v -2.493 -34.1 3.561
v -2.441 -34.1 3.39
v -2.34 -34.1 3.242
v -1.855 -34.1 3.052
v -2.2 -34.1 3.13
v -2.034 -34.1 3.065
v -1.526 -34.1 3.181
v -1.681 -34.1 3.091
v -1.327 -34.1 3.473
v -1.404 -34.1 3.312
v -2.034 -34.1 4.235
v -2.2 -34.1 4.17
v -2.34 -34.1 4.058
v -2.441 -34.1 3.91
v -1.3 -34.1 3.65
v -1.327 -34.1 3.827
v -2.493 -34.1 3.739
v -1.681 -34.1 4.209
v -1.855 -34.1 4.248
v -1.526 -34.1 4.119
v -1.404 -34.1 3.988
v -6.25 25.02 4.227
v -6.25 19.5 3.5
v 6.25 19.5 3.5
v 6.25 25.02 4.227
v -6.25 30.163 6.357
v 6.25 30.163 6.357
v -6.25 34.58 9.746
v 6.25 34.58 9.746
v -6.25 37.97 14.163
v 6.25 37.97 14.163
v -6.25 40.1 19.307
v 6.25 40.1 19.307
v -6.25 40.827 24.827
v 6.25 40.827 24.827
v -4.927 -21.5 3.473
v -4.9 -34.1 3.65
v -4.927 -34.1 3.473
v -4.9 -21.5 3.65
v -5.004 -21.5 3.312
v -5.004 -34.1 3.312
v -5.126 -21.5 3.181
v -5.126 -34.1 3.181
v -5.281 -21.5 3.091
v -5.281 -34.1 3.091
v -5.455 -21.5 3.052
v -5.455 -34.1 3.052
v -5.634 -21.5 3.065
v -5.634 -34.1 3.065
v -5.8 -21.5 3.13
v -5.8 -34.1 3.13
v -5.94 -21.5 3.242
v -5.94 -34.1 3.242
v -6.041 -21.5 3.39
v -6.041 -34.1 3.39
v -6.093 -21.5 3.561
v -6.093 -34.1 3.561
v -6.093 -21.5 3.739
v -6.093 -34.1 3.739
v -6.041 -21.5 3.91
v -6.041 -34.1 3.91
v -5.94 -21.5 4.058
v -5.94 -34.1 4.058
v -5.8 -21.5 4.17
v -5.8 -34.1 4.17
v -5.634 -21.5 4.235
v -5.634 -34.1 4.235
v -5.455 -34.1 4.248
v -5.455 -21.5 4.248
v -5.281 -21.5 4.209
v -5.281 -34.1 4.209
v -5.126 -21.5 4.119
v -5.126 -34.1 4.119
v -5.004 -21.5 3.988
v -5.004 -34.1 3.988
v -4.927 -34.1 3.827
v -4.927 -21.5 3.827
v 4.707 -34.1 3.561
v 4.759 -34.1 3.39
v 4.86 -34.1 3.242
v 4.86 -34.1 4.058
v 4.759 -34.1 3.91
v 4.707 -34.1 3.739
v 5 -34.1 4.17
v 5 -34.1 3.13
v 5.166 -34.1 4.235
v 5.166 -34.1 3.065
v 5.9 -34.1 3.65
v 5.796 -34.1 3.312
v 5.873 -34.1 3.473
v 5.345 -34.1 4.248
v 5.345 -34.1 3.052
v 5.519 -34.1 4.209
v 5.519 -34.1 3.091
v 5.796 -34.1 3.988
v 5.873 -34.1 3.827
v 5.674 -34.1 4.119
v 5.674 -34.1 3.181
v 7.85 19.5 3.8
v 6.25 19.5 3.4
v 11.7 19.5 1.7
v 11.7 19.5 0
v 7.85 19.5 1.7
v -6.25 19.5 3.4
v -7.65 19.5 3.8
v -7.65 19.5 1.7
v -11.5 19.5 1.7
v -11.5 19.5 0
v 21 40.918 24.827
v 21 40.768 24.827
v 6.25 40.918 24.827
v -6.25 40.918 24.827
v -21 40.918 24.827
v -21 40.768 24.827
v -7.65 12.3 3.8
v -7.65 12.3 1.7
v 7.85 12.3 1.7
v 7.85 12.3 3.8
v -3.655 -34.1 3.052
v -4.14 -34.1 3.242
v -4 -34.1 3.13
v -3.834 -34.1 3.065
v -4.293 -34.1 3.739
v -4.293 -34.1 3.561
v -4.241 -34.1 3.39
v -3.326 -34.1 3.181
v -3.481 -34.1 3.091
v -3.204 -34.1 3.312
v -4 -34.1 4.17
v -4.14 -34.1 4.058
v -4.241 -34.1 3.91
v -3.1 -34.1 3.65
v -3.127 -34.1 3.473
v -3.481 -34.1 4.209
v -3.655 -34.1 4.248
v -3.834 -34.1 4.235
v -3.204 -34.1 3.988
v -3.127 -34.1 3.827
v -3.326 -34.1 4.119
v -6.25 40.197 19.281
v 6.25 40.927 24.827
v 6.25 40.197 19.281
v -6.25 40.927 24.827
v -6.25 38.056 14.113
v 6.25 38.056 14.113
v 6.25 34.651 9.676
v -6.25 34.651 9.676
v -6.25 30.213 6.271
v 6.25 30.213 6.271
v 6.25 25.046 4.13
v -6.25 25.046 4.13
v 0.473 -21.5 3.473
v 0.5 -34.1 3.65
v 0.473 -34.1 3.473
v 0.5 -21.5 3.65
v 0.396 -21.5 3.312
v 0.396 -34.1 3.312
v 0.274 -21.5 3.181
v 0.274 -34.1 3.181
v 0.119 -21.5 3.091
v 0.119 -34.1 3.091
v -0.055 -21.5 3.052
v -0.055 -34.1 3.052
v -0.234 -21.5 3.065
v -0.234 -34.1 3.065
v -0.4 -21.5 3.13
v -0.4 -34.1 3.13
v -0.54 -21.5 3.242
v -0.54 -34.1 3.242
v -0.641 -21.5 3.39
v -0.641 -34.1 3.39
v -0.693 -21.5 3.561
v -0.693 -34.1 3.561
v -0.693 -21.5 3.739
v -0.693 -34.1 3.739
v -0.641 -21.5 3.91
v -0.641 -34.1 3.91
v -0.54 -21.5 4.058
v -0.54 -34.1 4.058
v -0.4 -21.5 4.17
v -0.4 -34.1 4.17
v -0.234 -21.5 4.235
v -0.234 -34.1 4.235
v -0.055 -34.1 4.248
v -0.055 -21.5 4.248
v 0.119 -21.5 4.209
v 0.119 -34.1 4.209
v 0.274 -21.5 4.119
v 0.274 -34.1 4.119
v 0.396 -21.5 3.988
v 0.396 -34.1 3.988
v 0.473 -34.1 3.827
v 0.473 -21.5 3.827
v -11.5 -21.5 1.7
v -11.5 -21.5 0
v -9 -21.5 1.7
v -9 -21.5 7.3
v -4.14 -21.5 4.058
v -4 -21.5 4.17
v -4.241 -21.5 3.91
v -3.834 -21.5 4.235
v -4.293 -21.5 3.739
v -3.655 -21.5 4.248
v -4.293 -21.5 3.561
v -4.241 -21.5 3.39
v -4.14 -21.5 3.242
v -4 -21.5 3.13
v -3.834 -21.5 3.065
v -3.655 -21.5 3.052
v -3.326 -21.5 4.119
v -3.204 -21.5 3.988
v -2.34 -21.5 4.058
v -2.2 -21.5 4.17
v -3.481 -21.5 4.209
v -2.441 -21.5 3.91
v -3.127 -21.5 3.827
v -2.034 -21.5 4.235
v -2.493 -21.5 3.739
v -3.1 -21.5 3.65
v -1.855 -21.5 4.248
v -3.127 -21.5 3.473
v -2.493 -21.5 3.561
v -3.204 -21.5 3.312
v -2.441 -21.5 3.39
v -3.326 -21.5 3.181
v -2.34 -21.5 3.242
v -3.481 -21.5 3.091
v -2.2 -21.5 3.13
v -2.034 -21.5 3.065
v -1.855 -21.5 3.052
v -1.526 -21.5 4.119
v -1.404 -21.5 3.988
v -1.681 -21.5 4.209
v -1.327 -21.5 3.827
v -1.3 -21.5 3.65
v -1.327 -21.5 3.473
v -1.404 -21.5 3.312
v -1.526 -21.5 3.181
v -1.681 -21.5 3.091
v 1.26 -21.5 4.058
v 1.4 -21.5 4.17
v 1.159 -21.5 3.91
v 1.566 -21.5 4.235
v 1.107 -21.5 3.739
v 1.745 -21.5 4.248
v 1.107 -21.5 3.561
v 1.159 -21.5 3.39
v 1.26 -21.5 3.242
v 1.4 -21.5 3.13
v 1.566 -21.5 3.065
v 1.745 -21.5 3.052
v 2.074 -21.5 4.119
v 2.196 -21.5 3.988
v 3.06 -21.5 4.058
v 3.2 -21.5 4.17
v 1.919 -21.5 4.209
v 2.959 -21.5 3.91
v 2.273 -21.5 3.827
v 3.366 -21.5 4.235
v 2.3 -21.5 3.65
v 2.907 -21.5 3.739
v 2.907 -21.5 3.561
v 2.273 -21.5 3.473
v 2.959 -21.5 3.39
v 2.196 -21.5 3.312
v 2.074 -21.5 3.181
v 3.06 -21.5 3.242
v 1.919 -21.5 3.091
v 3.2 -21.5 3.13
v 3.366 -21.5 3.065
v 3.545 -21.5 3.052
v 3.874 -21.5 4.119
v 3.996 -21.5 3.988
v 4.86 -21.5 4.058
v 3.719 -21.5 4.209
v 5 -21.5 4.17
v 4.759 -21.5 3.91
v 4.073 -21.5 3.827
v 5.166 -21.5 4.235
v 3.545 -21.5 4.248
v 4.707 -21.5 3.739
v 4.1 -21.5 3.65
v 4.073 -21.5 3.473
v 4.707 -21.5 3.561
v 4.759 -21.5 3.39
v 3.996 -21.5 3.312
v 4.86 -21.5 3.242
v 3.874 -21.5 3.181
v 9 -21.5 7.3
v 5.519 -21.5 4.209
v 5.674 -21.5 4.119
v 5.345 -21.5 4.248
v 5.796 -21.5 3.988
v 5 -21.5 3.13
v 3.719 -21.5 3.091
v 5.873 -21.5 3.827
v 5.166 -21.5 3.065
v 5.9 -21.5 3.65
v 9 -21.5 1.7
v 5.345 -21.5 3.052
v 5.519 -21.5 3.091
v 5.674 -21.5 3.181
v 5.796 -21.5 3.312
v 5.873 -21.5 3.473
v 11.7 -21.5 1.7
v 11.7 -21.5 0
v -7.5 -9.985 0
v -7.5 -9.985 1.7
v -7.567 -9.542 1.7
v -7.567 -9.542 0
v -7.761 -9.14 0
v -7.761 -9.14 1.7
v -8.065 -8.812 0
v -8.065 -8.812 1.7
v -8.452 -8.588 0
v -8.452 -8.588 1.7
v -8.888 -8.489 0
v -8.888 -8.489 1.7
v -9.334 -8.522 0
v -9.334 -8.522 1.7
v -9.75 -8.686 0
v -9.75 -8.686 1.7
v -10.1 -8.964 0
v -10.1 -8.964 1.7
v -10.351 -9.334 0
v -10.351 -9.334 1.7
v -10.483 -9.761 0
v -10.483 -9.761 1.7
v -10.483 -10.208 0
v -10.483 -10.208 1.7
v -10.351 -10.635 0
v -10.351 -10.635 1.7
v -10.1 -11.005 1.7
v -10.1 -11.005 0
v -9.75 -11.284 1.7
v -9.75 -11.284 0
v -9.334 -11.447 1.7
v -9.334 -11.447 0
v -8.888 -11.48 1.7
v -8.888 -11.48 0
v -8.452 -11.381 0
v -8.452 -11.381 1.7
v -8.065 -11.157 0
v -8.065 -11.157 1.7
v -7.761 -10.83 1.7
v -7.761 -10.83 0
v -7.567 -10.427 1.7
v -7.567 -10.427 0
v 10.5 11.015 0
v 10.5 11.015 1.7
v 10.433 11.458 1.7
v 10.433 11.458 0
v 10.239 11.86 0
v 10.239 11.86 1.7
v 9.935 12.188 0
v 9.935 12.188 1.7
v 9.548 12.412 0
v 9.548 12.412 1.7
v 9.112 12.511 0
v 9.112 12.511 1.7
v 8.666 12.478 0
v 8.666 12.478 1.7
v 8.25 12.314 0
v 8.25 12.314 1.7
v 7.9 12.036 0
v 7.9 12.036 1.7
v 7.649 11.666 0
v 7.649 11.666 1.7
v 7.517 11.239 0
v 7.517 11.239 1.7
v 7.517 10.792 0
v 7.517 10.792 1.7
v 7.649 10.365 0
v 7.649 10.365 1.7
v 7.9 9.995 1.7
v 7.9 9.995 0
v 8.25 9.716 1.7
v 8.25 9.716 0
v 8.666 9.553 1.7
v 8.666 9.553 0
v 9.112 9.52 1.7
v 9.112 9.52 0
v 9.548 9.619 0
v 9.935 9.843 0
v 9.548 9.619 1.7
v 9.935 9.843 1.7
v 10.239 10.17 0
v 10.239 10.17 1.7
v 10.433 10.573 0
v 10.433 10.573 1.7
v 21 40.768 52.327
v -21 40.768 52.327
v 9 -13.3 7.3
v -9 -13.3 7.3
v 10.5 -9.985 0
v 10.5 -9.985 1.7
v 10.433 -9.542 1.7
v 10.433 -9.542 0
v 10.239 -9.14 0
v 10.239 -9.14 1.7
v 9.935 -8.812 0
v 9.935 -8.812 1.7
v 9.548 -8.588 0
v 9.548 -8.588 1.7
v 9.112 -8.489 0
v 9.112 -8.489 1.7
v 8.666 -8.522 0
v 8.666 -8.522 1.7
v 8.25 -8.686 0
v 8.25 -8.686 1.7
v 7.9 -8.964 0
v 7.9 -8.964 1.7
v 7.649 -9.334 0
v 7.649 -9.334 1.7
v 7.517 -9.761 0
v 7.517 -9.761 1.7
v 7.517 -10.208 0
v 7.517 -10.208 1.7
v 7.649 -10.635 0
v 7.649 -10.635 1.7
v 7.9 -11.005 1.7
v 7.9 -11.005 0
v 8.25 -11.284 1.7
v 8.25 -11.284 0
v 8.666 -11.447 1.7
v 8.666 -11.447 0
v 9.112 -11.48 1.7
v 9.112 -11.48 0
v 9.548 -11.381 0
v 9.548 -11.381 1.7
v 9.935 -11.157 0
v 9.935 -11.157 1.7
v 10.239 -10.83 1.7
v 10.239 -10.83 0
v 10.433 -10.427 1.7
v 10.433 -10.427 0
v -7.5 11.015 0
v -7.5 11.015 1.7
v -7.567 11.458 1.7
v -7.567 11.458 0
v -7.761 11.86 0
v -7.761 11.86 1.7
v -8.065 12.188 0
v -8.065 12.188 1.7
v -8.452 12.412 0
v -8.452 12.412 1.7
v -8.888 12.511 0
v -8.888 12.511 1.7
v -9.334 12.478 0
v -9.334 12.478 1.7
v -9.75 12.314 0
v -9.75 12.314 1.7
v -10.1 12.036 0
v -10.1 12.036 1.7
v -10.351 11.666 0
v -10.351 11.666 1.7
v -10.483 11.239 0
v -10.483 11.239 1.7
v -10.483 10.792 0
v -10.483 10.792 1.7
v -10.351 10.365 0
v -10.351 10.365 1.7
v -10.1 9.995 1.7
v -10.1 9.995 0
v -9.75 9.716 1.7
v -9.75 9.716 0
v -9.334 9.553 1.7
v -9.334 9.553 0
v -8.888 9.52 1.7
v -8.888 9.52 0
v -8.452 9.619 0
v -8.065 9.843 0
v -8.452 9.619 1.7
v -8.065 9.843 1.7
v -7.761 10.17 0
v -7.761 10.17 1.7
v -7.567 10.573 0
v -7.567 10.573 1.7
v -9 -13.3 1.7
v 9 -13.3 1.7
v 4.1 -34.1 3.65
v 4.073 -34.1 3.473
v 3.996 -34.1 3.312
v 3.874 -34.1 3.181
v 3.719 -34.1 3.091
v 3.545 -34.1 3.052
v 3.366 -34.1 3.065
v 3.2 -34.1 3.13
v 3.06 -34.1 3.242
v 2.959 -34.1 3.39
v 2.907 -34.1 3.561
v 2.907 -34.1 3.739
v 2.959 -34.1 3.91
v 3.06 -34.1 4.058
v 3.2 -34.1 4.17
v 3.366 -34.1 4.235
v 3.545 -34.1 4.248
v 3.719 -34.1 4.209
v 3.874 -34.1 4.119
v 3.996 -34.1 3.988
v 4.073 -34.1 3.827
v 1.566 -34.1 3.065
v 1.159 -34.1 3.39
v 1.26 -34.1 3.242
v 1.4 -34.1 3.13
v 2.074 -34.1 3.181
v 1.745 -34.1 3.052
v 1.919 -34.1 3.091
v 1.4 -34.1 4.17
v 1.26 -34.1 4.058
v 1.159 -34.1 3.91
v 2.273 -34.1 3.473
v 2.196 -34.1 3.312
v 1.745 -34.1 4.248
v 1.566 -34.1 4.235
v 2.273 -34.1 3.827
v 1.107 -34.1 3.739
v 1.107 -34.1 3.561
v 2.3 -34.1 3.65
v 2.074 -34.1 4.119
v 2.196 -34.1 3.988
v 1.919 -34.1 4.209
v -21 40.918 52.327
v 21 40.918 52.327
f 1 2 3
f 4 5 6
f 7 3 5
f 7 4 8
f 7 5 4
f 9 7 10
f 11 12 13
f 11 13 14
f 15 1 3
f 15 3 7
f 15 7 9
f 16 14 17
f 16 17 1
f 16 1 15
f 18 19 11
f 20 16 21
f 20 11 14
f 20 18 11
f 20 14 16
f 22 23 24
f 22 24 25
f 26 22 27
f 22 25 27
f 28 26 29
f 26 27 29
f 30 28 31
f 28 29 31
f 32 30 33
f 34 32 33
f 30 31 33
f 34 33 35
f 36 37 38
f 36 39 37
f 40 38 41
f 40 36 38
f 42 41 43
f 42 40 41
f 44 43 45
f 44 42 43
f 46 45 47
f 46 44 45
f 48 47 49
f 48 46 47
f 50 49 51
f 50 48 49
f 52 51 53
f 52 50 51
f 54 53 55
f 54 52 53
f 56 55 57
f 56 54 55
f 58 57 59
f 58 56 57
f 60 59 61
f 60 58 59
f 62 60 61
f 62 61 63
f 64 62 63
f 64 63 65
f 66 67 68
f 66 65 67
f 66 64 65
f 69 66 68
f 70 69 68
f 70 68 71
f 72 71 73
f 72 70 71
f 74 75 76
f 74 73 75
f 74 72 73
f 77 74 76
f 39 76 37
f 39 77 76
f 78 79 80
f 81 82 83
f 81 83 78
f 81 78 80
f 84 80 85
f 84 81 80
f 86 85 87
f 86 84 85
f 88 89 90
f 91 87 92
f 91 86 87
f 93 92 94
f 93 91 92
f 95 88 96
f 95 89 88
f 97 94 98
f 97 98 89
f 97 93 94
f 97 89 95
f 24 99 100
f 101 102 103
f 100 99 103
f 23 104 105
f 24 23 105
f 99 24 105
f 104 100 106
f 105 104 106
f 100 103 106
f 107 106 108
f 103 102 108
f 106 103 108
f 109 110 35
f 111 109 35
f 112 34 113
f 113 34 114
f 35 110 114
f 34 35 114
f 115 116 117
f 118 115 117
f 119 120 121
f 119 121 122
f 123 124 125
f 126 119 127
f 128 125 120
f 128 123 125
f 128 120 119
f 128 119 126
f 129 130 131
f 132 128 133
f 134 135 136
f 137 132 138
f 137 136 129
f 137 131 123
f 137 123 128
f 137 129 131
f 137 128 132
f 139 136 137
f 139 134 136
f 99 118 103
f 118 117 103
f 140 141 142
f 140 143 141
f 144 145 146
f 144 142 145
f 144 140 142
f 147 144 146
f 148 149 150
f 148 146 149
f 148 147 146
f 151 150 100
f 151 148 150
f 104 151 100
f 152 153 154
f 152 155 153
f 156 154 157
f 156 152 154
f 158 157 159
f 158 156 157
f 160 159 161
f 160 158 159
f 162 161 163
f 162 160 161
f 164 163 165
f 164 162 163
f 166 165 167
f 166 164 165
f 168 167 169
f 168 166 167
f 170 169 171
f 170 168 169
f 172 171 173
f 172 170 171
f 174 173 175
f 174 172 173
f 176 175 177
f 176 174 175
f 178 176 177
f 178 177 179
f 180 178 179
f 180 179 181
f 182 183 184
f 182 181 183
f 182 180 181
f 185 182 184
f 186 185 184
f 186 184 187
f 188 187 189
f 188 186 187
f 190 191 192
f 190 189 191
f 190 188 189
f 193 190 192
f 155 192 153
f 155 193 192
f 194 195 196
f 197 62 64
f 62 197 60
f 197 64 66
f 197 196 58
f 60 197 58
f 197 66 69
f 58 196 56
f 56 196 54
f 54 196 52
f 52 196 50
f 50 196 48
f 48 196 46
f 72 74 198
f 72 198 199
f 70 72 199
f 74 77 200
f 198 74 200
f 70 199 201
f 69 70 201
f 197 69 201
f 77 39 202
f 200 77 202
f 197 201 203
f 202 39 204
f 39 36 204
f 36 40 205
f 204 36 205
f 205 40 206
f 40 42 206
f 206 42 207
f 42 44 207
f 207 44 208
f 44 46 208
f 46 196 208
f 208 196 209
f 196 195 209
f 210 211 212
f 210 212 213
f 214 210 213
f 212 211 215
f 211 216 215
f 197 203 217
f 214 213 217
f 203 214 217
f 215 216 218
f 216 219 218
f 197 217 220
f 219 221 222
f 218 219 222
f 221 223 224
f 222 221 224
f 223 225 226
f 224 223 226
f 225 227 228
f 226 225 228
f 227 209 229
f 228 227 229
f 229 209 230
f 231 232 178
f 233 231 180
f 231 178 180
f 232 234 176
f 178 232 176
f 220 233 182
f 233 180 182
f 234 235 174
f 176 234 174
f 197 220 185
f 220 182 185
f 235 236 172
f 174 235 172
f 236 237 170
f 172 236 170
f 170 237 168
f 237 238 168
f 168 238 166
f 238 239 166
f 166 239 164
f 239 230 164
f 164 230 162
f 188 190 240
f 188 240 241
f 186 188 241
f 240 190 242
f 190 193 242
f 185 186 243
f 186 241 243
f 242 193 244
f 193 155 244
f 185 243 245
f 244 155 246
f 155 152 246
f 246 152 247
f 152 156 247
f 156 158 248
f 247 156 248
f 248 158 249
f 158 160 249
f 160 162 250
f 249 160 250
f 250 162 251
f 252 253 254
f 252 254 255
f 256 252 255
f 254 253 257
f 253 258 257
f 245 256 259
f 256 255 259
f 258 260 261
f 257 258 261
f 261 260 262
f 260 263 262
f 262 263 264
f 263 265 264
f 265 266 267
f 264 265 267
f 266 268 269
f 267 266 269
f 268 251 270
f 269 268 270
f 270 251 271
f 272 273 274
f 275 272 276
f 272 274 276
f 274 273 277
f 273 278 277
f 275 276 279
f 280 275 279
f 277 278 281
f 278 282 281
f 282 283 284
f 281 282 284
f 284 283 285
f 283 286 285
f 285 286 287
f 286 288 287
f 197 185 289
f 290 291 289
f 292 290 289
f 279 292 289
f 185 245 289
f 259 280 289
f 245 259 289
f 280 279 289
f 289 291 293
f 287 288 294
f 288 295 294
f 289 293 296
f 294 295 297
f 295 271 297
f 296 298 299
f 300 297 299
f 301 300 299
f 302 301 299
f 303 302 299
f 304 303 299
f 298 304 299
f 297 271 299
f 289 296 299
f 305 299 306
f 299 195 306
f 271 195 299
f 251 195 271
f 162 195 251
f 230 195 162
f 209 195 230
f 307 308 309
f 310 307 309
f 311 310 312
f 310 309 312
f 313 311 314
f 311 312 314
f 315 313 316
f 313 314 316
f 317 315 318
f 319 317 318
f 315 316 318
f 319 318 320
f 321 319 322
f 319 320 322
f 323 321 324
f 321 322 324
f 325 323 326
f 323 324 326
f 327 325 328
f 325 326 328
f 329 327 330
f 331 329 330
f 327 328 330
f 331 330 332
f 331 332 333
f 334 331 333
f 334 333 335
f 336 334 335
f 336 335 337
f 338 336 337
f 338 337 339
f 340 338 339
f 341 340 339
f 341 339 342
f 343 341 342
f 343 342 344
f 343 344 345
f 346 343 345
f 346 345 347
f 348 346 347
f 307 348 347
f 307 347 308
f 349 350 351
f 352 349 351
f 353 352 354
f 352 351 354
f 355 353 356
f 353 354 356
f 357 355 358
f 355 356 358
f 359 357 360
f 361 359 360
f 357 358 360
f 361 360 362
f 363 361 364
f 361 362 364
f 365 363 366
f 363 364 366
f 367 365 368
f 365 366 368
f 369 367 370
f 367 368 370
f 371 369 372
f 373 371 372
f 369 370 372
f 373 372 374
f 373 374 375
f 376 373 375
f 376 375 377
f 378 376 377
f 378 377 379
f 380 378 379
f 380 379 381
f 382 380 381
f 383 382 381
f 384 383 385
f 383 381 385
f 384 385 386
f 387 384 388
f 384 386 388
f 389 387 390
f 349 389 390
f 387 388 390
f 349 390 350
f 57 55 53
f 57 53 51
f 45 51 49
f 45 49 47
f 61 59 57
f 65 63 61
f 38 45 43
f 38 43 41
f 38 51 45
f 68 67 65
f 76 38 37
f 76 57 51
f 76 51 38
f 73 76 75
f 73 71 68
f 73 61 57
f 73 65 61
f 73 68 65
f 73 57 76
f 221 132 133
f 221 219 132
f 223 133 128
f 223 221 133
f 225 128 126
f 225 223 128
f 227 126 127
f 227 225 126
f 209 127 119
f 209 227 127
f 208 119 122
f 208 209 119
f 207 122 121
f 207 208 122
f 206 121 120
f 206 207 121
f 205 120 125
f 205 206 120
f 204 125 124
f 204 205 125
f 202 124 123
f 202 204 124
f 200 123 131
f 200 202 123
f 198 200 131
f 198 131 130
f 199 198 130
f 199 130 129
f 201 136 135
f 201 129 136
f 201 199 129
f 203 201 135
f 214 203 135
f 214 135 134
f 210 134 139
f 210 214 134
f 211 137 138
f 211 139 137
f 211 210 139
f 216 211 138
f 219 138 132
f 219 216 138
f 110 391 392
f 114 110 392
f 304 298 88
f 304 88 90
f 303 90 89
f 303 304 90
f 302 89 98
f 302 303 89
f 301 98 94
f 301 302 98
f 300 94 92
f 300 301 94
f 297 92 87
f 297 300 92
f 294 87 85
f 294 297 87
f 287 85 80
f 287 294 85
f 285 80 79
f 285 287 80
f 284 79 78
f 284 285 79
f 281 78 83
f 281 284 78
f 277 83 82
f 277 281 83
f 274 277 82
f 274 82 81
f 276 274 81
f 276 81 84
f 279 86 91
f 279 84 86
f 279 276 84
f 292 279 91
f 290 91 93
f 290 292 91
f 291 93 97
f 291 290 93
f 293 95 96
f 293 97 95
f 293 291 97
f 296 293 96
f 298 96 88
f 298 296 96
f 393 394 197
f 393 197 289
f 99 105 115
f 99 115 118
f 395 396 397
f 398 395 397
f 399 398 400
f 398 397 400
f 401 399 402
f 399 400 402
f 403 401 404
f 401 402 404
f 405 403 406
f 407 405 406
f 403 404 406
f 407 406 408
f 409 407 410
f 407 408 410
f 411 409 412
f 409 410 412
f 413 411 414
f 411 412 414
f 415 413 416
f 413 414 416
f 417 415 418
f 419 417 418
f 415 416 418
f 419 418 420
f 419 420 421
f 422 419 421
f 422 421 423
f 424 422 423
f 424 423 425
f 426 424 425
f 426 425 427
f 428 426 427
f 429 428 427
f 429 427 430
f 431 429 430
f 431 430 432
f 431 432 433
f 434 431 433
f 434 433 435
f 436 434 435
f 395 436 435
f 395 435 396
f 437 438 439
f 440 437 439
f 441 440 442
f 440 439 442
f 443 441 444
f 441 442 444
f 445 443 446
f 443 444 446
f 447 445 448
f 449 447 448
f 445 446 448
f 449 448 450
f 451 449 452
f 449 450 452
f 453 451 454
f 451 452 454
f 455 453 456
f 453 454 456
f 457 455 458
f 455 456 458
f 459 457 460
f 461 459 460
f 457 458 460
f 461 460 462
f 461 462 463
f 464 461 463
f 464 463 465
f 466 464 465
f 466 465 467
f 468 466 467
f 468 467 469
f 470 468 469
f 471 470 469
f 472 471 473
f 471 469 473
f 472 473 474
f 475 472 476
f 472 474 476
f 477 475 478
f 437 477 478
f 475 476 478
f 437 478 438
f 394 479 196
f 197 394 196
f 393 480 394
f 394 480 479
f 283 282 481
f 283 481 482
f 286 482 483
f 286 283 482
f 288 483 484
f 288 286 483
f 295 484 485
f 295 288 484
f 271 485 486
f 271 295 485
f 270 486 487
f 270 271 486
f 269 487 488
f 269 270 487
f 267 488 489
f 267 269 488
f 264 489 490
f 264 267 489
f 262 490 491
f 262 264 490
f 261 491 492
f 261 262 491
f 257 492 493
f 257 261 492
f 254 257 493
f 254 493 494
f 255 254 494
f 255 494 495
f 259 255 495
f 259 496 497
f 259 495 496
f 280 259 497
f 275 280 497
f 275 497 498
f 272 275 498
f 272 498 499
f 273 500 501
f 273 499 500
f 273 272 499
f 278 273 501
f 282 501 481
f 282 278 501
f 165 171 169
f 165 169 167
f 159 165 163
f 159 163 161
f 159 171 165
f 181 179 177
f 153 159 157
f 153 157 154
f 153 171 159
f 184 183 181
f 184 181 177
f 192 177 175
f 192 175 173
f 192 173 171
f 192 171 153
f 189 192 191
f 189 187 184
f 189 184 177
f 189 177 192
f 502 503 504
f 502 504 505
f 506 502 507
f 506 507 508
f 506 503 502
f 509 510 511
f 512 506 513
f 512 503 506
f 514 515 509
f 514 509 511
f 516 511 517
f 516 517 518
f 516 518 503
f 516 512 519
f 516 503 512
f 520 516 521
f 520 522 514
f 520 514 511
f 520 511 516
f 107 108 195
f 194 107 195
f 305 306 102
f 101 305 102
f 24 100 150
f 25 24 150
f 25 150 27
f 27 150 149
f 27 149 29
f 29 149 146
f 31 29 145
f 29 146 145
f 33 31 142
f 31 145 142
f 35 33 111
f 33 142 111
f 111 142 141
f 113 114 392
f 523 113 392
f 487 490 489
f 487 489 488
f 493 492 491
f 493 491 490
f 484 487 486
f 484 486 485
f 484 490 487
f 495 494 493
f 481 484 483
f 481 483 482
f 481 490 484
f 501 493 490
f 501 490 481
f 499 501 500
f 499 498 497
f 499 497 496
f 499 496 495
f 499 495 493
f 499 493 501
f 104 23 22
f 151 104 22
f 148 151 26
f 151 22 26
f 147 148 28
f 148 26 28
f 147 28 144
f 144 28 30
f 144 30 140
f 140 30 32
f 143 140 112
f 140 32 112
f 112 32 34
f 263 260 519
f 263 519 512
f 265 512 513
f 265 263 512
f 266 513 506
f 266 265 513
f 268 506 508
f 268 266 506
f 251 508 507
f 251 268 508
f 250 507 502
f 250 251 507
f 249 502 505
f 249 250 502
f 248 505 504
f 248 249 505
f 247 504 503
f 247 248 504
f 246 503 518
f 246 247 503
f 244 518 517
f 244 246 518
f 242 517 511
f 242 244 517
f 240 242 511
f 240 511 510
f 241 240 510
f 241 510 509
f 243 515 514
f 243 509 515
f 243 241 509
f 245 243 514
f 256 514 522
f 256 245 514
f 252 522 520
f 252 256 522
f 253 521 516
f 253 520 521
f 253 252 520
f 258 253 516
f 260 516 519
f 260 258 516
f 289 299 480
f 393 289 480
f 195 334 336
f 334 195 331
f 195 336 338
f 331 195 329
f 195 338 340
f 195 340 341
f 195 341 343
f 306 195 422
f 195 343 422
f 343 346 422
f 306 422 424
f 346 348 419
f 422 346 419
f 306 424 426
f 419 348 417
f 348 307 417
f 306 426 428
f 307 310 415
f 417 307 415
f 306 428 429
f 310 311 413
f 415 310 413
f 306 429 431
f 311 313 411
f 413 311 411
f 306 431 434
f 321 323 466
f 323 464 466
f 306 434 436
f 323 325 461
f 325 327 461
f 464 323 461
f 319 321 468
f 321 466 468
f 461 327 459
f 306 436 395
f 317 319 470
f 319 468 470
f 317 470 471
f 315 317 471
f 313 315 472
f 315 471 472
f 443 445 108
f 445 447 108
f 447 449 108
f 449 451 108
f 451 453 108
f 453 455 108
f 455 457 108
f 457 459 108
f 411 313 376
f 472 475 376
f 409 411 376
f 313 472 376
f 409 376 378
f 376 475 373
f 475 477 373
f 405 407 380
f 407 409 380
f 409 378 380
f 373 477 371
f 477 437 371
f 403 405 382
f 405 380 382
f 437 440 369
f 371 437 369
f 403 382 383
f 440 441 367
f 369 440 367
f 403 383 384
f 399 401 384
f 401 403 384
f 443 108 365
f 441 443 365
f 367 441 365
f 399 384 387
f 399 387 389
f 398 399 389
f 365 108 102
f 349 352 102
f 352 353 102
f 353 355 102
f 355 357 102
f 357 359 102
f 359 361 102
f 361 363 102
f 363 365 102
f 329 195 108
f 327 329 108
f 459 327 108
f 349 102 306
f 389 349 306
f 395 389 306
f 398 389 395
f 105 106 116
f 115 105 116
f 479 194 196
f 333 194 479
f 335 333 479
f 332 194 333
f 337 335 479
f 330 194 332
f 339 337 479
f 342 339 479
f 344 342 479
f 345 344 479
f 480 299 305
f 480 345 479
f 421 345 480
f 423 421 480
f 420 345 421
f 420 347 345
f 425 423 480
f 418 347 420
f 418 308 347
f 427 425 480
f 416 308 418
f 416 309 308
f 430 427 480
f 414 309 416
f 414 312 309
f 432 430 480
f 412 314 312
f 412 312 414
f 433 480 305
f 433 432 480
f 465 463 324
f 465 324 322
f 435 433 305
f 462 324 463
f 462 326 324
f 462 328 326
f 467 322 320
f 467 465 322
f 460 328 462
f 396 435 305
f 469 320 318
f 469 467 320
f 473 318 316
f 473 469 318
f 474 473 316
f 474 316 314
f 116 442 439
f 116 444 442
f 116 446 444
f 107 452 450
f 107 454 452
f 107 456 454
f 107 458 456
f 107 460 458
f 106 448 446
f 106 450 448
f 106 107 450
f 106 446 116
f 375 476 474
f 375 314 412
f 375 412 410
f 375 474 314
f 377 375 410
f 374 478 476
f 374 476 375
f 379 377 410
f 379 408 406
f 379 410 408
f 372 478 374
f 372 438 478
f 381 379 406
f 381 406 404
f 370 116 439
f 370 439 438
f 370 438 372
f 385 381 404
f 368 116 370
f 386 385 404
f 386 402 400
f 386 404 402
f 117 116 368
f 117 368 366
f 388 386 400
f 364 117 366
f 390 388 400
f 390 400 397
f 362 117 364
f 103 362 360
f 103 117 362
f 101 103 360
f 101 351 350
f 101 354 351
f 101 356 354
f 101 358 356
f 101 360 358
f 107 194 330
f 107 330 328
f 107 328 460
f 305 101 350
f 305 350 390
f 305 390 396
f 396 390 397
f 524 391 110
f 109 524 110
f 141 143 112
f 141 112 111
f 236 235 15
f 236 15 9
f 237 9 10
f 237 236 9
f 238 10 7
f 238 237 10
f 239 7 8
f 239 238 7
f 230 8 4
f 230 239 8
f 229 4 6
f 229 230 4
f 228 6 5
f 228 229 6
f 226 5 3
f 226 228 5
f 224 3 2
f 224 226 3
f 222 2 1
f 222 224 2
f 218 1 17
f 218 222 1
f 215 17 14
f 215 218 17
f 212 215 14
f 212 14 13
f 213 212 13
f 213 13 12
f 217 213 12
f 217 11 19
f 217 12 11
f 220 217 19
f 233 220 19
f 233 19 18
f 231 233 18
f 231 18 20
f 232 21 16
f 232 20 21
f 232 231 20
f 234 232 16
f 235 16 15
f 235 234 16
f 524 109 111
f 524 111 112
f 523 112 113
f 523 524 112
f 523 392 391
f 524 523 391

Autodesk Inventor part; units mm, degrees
ref_plane "YZ Plane" through (0, 0, 0) normal (1, 0, 0) x (0, 1, 0)
ref_plane "XZ Plane" through (0, 0, 0) normal (0, 1, 0) x (-1, 0, 0)
ref_plane "XY Plane" through (0, 0, 0) normal (0, 0, 1) x (1, 0, 0)
sketch "Эскиз1" plane through (0, 0, 0) normal (0, 0, 1) x (1, 0, 0)
  line L0 (-11.5, -21.5) -> (11.7, -21.5)
  line L1 (11.7, -21.5) -> (11.7, 19.5)
  line L2 (11.7, 19.5) -> (-11.5, 19.5)
  line L3 (-11.5, 19.5) -> (-11.5, -21.5)
  circle A0 centre (-9, -10.5) radius 1.5 projected
  point P0 (0, 0)
  dimension "d0" = 23.2
  dimension "d1" = 41
  dimension "d4" = 11
  dimension "d5" = 2.5
extrude "Выдавливание1" add sketch "Эскиз1" along normal blind 1.7 contours L3 L2 L1 L0 | A0
sketch "Эскиз2" plane through (0, 0, 1.7) normal (0, 0, 1) x (1, 0, 0)
  circle A0 centre (-9, -9.9846) radius 1.5 projected
  circle A1 centre (9, -9.9846) radius 1.5 projected
  circle A2 centre (-9, 11.0154) radius 1.5 projected
  circle A3 centre (9, 11.0154) radius 1.5 projected
  point P0 (0, 0)
extrude "Выдавливание2" cut sketch "Эскиз2" against normal blind 1.7
sketch "Эскиз3" plane through (0, 0, 1.7) normal (0, 0, 1) x (1, 0, 0)
  line L0 (-9, -21.5) -> (9, -21.5)
  line L1 (9, -21.5) -> (9, -13.3)
  line L2 (9, -13.3) -> (-9, -13.3)
  line L3 (-9, -13.3) -> (-9, -21.5)
  line L4 (-11.5, -21.5) -> (11.7, -21.5) projected
  point P0 (0, 0)
  point P1 (0, -21.5)
  point P2 (0.1, -21.5)
  dimension "d8" = 18
  dimension "d9" = 8.2
extrude "Выдавливание3" add sketch "Эскиз3" along normal blind 5.6
sketch "Эскиз4" plane through (-11.5, -21.5, 0) normal (0, -1, 0) x (1, 0, 0)
  circle A0 centre (6, 3.65) radius 0.6
  line L0 (2.5, 7.3) -> (20.5, 7.3) projected
  line L1 (6, 7.3) -> (6, 0) construction
  line L2 (0, 0) -> (0, 1.7) projected
  circle A1 centre (7.8, 3.65) radius 0.6
  circle A2 centre (9.6, 3.65) radius 0.6
  circle A3 centre (11.4, 3.65) radius 0.6
  circle A4 centre (13.2, 3.65) radius 0.6
  circle A5 centre (15, 3.65) radius 0.6
  circle A6 centre (16.8, 3.65) radius 0.6
  point P0 (11.5, 0)
  dimension "d12" = 1.2
  dimension "d13" = 6
  dimension "d16" = 1.8
extrude "Выдавливание4" add sketch "Эскиз4" along normal blind 12.6
sketch "Эскиз5" plane through (0, 0, 1.7) normal (0, 0, 1) x (1, 0, 0)
  line L0 (-7.65, 12.3) -> (7.85, 12.3)
  line L1 (7.85, 12.3) -> (7.85, 19.5)
  line L2 (7.85, 19.5) -> (-7.65, 19.5)
  line L3 (-7.65, 19.5) -> (-7.65, 12.3)
  line L4 (11.7, 19.5) -> (-11.5, 19.5) projected
  point P0 (0, 0)
  point P1 (0.1, 19.5)
  point P2 (0.1, 19.5)
  dimension "d23" = 15.5
  dimension "d24" = 7.2
extrude "Выдавливание5" add sketch "Эскиз5" along normal blind 2.1
sketch "Эскиз6" plane through (-11.5, 19.5, 0) normal (0, 1, 0) x (1, 0, 0)
  line L0 (17.75, -3.5) -> (5.25, -3.5)
  line L1 (5.25, -3.5) -> (5.25, -3.4)
  line L2 (5.25, -3.4) -> (17.75, -3.4)
  line L3 (17.75, -3.4) -> (17.75, -3.5)
  line L4 (20.5, -7.3) -> (2.5, -7.3) projected
  line L5 (19.35, -3.8) -> (3.85, -3.8) projected
  point P0 (11.5, 0)
  point P1 (11.5, -3.4)
  point P2 (11.5, -7.3)
  dimension "d27" = 12.5
  dimension "d28" = 0.1
  dimension "d29" = 0.3
sketch "Эскиз7" plane through (0, 0, 0) normal (1, 0, 0) x (0, 1, 0)
  line L0 (19.5, 3.4) -> (19.5, 3.5) projected
  line L1 (20.262, -17.8921) -> (54.1609, -17.8921) construction
  arc A0 (19.5, 3.5) -> (40.8268, 24.8268) centre (19.5, 24.8268) ccw
  line L2 (19.5, 1.7) -> (19.5, 3.8) projected
  line L3 (31.9208, 24.8268) -> (55.6437, 24.8268) construction
  point P0 (0, 0)
  dimension "d40" = 33.5
sweep "Сдвиг1" add profiles "Эскиз6" path "Эскиз7" path curves A0
ref_plane "РабПлоскость2" through (0, 40.768, -17.8921) normal (0, 1, 0) x (-1, 0, 0)
sketch "Эскиз9" plane through (0, 40.768, -17.8921) normal (0, 1, 0) x (-1, 0, 0)
  line L0 (21, 70.2189) -> (-21, 70.2189)
  line L1 (-21, 70.2189) -> (-21, 42.7189)
  line L2 (-21, 42.7189) -> (21, 42.7189)
  line L3 (21, 42.7189) -> (21, 70.2189)
  line L4 (-6.25, 42.7189) -> (6.25, 42.7189) projected
  point P0 (0, 17.8921)
  point P1 (0, 42.7189)
  dimension "d41" = 42
  dimension "d42" = 27.5
extrude "Выдавливание6" add sketch "Эскиз9" along normal blind 0.15
properties part number "ЛЦМК000002.00.00.00.00.13 OLED"
